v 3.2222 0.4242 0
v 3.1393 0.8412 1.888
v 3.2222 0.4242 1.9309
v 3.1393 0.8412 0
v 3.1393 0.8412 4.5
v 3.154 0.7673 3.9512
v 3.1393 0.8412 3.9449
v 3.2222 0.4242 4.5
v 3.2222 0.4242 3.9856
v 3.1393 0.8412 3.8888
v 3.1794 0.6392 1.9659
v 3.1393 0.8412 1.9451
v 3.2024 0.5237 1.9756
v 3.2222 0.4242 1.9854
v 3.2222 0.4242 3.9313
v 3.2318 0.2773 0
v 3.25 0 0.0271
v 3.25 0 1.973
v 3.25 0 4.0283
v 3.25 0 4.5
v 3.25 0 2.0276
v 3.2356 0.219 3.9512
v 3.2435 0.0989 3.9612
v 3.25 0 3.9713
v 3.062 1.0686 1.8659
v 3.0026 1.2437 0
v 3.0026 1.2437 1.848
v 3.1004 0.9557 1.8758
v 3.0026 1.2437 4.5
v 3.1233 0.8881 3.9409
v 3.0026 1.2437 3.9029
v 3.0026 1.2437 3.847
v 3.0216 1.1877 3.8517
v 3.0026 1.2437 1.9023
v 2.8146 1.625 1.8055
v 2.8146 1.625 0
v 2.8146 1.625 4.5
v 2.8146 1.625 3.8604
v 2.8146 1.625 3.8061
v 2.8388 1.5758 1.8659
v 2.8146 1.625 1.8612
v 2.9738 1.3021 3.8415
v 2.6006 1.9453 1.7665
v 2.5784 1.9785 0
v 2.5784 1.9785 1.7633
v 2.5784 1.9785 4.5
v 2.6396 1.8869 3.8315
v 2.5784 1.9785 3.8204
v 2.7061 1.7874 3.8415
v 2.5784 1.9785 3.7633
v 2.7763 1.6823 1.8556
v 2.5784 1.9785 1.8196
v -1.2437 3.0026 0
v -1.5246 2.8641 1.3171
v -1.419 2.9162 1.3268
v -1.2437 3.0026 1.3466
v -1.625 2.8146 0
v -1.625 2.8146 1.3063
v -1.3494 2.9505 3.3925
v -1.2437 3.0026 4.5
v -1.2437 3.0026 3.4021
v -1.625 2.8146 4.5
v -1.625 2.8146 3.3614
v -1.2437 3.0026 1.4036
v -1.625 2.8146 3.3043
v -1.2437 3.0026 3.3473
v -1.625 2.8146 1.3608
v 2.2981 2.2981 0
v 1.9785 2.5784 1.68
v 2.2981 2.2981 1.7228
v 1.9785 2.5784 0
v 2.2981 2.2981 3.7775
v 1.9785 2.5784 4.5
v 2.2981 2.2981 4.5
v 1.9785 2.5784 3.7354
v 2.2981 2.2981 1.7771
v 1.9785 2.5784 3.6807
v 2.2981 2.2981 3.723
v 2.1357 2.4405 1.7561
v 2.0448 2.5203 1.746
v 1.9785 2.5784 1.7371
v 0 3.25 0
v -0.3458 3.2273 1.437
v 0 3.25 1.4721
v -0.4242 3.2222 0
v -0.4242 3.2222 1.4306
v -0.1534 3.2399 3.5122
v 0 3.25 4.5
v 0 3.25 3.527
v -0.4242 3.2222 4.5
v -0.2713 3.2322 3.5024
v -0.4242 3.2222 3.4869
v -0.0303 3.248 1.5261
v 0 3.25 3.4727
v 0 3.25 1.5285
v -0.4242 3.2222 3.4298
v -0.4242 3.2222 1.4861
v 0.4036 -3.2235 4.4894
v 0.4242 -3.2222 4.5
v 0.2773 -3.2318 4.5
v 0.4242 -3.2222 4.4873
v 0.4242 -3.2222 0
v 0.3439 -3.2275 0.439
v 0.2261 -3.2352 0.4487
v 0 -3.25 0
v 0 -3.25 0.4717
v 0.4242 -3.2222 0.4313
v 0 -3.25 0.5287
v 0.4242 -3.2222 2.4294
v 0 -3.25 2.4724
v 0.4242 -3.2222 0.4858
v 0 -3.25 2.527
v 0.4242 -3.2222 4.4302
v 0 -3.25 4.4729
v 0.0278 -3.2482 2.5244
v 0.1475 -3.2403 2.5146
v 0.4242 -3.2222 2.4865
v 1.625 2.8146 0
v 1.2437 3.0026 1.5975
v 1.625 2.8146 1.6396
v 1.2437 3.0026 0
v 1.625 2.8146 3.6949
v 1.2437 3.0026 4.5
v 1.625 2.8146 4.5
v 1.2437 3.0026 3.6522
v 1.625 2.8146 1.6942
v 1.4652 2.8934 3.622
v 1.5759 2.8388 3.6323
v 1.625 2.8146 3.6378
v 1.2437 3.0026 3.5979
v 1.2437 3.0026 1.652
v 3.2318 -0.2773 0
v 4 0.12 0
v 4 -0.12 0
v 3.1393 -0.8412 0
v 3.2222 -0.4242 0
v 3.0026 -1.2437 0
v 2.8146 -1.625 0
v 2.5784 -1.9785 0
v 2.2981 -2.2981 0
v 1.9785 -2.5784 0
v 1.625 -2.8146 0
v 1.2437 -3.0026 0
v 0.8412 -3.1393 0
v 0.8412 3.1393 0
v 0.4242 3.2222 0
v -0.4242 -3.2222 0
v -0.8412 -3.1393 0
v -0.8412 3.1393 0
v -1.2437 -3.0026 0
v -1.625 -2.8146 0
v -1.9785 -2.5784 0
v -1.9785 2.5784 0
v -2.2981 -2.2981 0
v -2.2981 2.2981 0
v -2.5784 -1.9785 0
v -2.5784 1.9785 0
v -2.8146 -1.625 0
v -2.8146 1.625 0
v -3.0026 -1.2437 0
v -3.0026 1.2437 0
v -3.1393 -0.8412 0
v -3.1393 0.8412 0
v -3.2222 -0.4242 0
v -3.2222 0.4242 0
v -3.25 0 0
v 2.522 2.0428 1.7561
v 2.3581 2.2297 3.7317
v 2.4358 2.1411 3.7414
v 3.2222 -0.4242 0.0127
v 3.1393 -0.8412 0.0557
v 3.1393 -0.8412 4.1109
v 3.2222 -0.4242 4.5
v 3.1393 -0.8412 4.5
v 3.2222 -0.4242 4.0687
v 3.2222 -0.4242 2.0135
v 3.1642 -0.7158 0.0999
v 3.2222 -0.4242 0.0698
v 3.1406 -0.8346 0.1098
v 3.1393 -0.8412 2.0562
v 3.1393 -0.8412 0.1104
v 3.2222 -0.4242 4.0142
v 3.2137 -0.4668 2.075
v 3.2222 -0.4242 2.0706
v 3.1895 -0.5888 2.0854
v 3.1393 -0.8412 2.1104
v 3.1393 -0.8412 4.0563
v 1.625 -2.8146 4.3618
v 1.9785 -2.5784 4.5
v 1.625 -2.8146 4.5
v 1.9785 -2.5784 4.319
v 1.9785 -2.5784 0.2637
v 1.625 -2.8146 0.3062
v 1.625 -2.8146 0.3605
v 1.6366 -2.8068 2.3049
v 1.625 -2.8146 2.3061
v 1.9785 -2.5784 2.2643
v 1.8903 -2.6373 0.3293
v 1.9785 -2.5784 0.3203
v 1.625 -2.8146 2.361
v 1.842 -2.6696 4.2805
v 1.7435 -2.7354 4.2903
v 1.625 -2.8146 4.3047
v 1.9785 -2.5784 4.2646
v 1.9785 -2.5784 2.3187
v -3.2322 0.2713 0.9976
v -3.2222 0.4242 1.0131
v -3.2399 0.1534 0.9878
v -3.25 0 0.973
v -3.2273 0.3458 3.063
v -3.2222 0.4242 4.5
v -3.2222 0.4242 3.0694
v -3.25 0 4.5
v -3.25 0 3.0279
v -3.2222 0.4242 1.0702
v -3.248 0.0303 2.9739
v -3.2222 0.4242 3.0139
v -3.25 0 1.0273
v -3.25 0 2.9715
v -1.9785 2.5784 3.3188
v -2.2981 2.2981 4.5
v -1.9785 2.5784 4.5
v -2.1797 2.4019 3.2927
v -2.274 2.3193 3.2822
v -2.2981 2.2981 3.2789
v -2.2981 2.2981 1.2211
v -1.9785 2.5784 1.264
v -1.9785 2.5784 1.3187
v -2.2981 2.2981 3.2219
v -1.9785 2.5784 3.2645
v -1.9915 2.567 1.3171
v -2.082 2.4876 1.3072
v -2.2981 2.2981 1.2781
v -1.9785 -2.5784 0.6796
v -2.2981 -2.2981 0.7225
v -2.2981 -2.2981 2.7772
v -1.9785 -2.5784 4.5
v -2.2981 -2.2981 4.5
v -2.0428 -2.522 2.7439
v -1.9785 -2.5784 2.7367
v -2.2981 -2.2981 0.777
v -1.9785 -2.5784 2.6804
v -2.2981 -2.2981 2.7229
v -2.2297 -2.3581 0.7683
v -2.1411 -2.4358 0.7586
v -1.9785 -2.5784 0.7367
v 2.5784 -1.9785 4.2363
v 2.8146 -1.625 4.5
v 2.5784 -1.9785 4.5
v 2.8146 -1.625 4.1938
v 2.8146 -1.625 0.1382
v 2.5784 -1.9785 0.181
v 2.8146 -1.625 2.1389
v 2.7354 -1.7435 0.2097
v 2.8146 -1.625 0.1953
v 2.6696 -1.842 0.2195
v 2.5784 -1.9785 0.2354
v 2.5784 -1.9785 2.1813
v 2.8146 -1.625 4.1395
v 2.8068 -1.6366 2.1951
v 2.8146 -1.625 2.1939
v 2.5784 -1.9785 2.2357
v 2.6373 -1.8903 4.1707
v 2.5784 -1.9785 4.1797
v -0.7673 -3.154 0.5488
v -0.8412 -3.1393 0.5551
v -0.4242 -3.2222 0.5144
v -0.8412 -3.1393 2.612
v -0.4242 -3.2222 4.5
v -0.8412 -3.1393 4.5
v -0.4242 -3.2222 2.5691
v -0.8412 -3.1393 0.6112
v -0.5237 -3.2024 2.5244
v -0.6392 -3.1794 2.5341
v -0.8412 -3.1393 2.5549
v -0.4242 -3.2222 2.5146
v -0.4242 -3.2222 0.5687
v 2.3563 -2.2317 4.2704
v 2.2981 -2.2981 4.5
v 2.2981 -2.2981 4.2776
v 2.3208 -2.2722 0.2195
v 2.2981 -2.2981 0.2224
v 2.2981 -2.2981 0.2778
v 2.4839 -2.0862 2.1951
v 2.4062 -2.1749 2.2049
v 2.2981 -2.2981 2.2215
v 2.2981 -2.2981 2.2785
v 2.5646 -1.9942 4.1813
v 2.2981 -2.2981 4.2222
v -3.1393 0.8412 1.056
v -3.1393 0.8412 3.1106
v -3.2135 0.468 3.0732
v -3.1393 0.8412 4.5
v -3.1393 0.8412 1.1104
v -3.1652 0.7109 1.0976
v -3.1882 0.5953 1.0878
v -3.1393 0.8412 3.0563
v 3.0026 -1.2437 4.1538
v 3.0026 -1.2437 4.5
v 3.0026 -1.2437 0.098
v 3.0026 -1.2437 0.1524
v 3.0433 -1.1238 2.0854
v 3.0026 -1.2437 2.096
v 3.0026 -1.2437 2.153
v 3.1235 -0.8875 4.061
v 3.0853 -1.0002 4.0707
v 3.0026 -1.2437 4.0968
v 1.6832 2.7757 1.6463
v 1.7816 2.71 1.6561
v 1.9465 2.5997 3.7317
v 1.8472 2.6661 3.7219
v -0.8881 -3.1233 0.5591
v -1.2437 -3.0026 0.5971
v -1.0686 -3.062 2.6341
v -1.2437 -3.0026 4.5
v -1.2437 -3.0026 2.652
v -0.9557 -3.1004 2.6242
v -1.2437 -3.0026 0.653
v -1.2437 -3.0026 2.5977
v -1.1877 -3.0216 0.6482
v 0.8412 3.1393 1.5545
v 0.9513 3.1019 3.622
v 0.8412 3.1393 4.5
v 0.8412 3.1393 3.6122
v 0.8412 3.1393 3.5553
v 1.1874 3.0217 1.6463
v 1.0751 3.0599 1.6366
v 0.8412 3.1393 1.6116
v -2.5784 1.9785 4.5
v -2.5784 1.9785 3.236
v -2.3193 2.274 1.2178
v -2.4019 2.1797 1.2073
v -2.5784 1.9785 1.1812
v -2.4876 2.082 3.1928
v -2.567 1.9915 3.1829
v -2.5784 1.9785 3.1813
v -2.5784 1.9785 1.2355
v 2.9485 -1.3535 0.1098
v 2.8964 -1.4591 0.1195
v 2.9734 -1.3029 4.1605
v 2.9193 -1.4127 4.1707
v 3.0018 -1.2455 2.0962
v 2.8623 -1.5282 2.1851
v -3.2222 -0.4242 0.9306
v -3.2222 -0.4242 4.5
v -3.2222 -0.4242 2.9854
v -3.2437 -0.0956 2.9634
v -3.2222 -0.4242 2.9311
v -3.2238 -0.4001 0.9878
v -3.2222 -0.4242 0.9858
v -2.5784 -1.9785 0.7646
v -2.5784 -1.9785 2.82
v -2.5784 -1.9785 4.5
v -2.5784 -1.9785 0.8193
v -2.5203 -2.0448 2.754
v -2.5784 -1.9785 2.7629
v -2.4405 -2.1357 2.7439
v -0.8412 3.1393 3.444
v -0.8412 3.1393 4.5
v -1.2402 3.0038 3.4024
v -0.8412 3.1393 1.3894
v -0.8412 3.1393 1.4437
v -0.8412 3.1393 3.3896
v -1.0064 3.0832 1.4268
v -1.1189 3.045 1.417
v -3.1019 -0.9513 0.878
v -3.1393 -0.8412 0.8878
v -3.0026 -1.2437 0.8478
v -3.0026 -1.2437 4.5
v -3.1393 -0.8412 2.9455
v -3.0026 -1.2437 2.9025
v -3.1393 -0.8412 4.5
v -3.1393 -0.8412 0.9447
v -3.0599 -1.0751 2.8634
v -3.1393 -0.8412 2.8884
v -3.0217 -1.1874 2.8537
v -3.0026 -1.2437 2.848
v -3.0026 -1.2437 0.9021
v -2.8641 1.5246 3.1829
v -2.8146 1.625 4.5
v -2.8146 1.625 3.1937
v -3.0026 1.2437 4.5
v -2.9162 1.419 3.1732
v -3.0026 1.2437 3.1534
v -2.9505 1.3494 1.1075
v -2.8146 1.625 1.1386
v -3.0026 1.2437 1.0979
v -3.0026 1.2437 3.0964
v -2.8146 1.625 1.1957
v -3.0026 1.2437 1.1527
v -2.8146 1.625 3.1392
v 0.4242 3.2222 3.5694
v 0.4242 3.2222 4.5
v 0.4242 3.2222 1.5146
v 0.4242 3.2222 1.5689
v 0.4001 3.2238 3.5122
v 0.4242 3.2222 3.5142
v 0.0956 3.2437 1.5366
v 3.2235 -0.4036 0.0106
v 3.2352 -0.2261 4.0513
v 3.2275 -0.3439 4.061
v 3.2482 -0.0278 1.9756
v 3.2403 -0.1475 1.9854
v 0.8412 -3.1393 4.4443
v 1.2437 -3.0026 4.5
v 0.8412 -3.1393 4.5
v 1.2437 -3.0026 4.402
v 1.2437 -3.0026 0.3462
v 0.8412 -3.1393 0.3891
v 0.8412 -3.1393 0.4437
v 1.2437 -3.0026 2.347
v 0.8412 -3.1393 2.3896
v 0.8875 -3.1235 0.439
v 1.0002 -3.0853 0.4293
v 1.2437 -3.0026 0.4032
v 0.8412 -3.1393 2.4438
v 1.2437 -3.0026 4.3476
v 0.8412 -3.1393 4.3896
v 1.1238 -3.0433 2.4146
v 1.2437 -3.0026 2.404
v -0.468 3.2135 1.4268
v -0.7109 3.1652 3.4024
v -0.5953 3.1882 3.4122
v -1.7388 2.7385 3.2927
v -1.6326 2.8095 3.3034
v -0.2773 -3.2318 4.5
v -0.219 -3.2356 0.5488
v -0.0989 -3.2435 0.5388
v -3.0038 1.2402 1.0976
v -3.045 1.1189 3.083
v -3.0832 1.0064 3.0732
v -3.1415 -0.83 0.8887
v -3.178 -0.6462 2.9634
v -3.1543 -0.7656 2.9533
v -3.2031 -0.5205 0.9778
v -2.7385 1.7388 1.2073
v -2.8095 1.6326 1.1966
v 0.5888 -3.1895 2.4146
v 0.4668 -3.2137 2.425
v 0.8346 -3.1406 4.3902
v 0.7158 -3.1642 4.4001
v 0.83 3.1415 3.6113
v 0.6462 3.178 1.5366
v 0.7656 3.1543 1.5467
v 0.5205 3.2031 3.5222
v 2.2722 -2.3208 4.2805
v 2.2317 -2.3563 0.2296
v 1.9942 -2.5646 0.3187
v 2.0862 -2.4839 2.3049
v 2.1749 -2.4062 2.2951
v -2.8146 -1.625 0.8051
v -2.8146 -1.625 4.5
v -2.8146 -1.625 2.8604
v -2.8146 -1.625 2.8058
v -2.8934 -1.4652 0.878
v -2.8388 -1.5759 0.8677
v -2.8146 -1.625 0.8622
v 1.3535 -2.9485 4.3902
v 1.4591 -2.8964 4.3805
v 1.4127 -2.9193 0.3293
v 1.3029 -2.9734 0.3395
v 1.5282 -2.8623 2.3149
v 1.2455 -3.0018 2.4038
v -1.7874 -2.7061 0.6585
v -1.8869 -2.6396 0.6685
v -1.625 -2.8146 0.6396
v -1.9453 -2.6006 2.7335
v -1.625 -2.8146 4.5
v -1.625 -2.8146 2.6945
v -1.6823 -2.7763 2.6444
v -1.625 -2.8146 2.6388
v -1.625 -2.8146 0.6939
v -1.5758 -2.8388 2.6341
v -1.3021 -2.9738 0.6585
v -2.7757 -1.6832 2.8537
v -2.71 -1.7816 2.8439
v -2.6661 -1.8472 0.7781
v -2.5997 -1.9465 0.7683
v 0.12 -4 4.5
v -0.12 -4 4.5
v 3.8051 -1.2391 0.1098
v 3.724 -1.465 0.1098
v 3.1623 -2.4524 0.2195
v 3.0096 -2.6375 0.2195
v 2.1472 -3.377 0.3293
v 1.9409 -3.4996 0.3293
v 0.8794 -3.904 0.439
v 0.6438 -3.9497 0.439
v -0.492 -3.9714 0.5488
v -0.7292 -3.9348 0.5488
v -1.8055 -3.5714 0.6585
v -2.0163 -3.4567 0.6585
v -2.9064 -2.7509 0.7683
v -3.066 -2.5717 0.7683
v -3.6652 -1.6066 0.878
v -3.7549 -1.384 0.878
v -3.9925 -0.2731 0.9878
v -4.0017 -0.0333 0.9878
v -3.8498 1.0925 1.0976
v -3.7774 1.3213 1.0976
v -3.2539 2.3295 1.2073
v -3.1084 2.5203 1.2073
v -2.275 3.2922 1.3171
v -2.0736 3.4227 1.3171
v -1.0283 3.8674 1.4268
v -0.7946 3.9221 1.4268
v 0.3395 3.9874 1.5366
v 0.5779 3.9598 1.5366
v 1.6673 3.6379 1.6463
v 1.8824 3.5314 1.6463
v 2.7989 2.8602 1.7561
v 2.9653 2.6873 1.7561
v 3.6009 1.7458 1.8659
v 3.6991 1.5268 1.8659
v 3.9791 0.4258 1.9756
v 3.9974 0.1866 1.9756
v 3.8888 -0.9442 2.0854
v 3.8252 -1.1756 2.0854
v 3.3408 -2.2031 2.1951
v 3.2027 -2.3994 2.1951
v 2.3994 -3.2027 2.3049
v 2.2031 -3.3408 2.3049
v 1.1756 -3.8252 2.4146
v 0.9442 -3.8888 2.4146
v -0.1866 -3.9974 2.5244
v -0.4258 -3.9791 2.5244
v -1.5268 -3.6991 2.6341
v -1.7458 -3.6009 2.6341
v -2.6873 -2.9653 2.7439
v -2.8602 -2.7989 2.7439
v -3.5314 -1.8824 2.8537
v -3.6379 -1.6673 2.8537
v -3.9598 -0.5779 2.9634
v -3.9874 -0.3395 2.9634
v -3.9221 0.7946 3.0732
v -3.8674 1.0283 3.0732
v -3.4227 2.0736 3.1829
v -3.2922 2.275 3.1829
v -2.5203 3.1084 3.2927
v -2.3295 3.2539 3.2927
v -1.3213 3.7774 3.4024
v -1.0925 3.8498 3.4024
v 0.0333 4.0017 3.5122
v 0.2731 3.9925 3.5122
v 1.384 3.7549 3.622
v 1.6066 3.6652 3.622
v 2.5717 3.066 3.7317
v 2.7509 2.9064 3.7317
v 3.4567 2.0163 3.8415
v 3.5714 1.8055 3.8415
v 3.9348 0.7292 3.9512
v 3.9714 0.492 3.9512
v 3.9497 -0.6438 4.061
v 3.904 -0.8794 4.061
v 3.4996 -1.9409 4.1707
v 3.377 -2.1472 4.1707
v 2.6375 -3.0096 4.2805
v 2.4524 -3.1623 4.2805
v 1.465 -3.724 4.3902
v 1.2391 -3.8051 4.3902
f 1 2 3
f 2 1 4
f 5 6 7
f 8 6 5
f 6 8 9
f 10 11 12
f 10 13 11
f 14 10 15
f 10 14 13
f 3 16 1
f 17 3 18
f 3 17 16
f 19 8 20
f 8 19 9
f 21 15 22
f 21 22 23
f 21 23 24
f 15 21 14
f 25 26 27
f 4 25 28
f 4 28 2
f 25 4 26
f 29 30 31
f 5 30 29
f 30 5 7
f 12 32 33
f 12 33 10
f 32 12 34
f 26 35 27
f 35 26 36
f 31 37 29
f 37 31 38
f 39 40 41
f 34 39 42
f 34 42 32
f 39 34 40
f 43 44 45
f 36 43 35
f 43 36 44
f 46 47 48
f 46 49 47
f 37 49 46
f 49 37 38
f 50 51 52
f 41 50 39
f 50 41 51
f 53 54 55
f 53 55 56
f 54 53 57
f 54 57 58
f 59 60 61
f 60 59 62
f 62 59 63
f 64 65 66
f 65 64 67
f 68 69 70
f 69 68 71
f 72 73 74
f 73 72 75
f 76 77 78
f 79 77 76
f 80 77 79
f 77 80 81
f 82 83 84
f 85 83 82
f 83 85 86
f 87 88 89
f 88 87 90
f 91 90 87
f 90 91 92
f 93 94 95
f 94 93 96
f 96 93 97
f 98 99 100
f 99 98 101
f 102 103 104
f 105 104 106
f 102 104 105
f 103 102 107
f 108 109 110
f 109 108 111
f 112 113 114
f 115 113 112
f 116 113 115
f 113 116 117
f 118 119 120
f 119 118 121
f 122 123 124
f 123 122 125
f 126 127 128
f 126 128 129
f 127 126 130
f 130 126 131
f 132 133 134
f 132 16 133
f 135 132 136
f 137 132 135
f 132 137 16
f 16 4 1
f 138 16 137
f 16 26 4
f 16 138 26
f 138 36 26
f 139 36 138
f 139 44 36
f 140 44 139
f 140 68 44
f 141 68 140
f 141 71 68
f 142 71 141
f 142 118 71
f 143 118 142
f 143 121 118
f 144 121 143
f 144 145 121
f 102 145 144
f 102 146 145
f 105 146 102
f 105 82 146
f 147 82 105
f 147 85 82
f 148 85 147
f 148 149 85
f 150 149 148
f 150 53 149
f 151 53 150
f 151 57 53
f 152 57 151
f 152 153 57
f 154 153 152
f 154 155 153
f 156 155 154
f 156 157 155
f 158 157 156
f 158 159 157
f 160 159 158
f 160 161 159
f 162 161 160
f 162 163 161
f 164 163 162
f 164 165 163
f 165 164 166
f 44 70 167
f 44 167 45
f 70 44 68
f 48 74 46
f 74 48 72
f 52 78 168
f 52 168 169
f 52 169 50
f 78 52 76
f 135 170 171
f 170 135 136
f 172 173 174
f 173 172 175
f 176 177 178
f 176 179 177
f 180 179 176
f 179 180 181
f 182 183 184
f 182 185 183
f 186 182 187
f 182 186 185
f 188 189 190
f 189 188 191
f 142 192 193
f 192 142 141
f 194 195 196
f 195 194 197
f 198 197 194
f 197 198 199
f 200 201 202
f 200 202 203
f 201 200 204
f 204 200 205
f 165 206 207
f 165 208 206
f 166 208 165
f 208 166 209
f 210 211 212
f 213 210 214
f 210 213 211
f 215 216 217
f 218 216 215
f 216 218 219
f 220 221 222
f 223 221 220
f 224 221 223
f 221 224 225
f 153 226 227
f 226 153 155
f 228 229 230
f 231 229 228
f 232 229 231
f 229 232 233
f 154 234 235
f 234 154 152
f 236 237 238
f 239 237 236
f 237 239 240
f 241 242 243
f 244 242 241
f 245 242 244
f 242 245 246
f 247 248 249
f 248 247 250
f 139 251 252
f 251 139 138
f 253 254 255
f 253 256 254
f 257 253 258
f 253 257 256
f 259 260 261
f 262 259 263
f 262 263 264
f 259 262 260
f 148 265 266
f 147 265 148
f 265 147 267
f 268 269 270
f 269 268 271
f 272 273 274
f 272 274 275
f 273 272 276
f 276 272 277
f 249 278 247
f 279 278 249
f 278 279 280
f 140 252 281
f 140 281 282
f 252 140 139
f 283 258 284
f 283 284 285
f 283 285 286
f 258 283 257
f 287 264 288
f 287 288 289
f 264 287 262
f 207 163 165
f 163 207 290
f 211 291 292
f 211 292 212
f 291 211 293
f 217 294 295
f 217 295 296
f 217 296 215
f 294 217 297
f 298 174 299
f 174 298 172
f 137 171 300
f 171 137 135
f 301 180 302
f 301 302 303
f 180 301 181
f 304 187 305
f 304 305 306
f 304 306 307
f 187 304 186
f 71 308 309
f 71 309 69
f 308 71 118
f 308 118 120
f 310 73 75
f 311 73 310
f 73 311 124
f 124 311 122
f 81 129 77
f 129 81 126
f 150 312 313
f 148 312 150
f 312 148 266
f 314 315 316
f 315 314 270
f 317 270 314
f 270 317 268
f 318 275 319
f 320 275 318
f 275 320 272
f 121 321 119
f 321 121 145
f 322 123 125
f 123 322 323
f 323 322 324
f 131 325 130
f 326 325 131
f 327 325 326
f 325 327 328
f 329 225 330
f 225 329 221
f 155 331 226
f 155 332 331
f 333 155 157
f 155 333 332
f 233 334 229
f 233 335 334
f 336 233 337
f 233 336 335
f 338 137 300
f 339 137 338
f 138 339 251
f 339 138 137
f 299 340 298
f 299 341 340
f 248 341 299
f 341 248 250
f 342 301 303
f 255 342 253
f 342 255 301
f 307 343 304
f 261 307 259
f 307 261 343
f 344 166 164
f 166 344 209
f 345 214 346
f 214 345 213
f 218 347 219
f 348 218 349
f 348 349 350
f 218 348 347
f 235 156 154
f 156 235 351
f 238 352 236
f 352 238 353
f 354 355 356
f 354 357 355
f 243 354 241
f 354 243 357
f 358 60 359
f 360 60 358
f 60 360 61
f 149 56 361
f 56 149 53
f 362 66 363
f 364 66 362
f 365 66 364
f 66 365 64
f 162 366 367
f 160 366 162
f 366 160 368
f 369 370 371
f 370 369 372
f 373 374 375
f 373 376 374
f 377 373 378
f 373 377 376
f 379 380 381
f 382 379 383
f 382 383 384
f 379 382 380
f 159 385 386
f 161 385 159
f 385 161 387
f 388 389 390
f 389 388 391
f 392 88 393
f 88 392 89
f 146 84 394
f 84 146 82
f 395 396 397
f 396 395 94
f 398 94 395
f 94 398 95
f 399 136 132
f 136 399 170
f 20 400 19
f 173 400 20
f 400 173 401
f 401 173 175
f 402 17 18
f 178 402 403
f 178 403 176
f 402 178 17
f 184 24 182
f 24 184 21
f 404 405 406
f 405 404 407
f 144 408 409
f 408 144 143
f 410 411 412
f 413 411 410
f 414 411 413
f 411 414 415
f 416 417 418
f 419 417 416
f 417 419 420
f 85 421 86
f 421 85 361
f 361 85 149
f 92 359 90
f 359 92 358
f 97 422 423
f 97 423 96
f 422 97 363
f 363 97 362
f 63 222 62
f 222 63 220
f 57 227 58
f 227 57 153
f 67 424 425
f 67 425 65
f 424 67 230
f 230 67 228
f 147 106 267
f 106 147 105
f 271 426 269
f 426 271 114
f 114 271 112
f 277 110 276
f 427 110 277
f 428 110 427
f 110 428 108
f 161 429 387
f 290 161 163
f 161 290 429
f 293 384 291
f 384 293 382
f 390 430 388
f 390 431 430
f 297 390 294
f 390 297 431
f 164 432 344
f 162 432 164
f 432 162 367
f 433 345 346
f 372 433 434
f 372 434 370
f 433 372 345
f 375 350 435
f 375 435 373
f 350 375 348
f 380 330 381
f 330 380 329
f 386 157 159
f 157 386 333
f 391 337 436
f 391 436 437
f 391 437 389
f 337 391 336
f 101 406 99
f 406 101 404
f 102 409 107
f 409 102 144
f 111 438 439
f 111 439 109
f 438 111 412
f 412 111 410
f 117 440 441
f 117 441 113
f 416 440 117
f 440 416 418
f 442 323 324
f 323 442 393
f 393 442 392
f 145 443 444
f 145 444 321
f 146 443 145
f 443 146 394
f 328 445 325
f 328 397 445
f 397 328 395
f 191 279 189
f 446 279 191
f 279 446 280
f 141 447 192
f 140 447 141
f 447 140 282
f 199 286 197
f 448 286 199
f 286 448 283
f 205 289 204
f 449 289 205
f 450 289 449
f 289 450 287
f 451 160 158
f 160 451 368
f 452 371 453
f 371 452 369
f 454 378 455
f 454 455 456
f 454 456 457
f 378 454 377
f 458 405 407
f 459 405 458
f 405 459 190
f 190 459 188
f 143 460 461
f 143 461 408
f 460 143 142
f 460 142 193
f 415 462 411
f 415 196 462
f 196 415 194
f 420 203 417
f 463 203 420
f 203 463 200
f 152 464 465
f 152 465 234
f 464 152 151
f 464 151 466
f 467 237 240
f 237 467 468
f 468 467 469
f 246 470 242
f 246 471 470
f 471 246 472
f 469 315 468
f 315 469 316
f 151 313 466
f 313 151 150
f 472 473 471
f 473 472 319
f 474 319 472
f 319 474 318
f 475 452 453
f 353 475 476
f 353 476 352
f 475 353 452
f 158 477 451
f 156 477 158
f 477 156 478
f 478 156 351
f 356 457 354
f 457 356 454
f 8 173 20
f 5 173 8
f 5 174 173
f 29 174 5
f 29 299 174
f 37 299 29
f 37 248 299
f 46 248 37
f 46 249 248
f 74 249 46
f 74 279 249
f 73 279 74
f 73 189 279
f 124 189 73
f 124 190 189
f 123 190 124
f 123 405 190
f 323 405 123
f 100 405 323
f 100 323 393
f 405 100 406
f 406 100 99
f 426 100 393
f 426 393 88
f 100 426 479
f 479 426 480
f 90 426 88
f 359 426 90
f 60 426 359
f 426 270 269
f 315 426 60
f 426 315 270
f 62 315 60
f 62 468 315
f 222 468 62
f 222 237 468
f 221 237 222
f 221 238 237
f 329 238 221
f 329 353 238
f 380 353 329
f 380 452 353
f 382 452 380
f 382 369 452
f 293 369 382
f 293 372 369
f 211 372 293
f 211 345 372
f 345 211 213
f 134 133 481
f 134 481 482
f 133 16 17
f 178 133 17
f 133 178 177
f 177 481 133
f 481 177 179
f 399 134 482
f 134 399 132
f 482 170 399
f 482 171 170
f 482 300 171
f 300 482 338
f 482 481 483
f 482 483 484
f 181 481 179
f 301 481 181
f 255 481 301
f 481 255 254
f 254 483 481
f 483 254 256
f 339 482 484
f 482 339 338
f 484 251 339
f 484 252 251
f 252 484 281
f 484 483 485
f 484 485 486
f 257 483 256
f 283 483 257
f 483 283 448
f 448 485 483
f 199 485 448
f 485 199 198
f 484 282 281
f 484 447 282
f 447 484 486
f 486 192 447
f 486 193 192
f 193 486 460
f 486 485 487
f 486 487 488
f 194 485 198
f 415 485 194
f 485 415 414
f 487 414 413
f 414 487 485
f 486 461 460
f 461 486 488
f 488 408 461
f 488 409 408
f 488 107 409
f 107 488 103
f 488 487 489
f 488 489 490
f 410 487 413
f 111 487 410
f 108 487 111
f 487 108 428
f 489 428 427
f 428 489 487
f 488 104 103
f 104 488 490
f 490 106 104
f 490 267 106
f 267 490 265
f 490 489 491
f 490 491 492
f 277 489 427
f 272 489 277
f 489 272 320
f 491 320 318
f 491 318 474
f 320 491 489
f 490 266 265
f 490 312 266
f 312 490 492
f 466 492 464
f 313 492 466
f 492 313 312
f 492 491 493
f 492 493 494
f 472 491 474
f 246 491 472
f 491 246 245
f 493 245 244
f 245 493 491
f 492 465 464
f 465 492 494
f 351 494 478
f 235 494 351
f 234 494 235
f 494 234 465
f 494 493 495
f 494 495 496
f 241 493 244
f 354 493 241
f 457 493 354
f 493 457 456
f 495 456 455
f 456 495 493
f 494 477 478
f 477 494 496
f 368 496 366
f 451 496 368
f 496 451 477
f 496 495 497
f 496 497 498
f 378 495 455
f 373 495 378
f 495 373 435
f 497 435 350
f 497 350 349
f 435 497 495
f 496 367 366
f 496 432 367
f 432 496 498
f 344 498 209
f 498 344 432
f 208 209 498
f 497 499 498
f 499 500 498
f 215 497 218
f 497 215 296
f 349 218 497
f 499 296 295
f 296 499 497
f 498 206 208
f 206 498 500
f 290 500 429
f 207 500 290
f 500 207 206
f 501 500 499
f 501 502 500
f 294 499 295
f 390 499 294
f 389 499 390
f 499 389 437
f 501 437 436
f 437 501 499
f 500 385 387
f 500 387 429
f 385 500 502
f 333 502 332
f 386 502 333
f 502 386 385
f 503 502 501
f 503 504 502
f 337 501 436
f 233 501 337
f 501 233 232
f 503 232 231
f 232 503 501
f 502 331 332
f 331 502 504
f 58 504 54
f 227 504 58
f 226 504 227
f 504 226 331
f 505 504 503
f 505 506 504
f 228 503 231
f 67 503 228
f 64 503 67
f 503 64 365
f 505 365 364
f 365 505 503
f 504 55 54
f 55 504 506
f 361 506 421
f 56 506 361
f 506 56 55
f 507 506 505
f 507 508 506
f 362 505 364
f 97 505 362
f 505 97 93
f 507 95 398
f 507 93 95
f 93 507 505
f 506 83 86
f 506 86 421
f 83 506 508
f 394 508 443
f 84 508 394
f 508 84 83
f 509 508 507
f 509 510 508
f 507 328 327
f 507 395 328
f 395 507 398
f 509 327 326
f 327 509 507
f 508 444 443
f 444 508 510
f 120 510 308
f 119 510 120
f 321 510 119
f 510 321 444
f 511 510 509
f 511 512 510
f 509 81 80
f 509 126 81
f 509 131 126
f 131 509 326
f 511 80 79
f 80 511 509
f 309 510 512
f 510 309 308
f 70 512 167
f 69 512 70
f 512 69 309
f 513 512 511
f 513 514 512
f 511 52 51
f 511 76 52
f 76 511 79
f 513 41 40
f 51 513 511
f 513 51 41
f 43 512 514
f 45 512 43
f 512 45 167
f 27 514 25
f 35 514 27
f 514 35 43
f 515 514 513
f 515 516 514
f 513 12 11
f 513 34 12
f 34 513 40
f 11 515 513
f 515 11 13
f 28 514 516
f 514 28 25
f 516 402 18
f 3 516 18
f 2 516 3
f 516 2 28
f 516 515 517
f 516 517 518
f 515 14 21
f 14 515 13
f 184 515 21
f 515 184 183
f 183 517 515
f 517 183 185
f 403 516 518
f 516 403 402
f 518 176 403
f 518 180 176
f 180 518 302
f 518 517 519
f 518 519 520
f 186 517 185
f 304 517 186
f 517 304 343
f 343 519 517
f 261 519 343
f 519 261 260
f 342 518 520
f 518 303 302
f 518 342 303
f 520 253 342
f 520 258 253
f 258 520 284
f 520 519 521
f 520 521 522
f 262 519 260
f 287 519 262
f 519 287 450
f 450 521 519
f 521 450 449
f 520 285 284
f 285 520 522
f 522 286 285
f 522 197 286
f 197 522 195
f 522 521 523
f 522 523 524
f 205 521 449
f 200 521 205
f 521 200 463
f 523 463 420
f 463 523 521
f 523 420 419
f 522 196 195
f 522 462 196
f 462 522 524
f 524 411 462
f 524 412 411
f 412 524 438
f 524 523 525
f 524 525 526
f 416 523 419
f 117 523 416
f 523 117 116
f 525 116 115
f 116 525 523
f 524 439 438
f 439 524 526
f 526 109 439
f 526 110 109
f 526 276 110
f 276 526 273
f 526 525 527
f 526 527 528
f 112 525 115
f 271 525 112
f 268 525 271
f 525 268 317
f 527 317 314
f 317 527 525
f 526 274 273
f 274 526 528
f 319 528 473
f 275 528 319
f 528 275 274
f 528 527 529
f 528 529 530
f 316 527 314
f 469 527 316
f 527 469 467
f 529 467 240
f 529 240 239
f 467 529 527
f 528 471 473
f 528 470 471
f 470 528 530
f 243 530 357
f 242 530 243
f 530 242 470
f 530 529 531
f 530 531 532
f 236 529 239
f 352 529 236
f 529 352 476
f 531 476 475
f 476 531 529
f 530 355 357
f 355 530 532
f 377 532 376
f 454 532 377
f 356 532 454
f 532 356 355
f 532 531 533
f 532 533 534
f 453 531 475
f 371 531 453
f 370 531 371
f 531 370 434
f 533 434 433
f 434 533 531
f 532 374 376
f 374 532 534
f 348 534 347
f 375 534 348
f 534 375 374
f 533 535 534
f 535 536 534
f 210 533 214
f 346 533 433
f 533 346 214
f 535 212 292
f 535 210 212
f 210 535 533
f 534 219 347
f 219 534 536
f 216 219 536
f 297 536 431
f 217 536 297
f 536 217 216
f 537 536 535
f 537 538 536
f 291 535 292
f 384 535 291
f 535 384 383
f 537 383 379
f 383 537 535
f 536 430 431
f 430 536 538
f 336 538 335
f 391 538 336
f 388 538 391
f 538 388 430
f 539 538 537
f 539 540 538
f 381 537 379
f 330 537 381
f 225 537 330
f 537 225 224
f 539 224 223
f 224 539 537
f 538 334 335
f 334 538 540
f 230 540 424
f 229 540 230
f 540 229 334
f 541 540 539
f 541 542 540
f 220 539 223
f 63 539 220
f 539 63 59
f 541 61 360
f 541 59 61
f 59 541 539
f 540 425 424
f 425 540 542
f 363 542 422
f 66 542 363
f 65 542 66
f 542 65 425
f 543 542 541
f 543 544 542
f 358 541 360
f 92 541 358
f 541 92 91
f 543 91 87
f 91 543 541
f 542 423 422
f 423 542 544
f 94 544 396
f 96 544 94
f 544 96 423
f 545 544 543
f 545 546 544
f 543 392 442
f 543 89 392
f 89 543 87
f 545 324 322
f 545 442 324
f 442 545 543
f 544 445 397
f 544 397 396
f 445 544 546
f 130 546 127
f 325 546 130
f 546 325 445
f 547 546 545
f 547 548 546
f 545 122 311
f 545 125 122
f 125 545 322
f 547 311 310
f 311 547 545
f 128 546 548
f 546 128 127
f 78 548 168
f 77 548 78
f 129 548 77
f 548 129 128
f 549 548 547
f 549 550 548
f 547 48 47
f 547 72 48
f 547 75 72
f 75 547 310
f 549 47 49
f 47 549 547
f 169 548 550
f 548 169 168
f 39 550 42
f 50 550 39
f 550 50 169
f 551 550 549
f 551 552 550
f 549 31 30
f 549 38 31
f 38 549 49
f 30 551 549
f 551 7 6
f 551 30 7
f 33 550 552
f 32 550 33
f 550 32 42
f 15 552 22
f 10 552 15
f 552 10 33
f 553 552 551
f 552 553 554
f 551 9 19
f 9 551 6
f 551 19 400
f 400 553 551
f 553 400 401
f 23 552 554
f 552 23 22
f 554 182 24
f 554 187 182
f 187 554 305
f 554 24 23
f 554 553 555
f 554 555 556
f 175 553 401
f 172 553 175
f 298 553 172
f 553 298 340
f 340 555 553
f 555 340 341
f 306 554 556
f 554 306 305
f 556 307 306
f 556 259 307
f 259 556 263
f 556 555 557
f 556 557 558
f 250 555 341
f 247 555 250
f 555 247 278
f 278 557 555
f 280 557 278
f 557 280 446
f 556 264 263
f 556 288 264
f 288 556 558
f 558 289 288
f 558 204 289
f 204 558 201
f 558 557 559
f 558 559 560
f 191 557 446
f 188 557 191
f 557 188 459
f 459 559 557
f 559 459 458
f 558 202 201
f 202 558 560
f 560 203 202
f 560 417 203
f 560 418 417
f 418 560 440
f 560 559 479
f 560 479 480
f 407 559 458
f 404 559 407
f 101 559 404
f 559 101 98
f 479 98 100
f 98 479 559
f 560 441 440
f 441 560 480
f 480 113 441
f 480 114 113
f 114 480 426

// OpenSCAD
$fn=48;
module thread_solid(){
  union(){
    cylinder(r=3.25,h=4.5);
    linear_extrude(height=4.5,twist=360*4.5/2.0,slices=ceil(4.5/2.0*18),convexity=30)
      polygon(points=[[3.25-0.08,-0.58/2],[4.0,-0.24/2],[4.0,0.24/2],[3.25-0.08,0.58/2]]);
  }
}
thread_solid();
